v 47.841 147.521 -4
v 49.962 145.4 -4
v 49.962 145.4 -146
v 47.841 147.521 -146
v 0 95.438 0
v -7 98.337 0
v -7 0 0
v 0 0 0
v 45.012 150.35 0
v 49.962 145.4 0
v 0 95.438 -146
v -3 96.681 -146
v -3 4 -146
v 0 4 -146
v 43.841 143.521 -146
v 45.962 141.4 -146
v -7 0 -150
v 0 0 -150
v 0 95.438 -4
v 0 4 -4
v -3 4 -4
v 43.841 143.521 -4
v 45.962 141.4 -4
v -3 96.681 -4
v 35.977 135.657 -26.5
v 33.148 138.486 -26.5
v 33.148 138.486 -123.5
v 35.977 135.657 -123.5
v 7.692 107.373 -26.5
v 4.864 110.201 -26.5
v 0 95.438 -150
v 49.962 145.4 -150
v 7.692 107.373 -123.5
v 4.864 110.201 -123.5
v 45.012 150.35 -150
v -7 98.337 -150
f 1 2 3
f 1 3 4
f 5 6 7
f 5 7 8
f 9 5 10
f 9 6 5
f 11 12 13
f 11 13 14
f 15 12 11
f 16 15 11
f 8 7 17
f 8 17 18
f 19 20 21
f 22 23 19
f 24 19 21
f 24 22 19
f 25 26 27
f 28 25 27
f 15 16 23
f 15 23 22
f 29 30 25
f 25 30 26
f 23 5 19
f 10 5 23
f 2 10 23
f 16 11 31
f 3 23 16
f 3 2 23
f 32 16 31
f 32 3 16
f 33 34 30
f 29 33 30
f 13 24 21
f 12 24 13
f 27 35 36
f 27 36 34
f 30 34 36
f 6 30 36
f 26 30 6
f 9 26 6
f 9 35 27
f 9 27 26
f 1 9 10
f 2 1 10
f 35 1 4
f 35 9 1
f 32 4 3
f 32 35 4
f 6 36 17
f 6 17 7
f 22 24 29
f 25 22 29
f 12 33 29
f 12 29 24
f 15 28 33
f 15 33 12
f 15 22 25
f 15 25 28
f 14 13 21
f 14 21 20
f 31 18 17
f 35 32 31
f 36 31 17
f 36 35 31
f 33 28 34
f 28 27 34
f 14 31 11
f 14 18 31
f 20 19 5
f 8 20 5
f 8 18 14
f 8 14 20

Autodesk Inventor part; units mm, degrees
ref_plane "YZ Plane" through (0, 0, 0) normal (1, 0, 0) x (0, 1, 0)
ref_plane "XZ Plane" through (0, 0, 0) normal (0, 1, 0) x (-1, 0, 0)
ref_plane "XY Plane" through (0, 0, 0) normal (0, 0, 1) x (1, 0, 0)
sketch "Sketch1" plane through (0, 0, 0) normal (0, 1, 0) x (-1, 0, 0)
  line L0 (0, 0) -> (7, 0)
  line L1 (7, 0) -> (7, -150)
  line L2 (7, -150) -> (0, -150)
  line L3 (0, -150) -> (0, -146)
  line L4 (0, -146) -> (3, -146)
  line L5 (3, -146) -> (3, -4)
  line L6 (3, -4) -> (0, -4)
  line L7 (0, -4) -> (0, 0)
  dimension "d4" = 7
  dimension "d5" = 3
  dimension "d6" = 4
  dimension "d7" = 150
sketch "Sketch2" plane through (0, 0, 0) normal (0, 0, 1) x (1, 0, 0)
  line L0 (0, 0) -> (0, 95.438)
  line L1 (0, 95.438) -> (49.962, 145.4)
  dimension "d8" = 135
  dimension "d9" = 95.438
  dimension "d10" = 70.657
sweep "Sweep1" add profiles "Sketch1" path "Sketch2"
sketch "Sketch3" plane through (45.0123, 150.3498, -150) normal (0.7071, 0.7071, 0) x (-0.7071, 0.7071, 0)
  line L0 (-7, 150) -> (-7, 146) projected
  line L1 (-74.4849, 4) -> (-7, 4) projected
  line L2 (-7, 146) -> (-7, 4)
  line L3 (-72.3635, 146) -> (-4, 146) projected
  line L4 (-7, 146) -> (-4, 146)
  line L5 (-4, 4) -> (-7, 4) projected
  line L6 (-4, 146) -> (-4, 4)
  line L7 (-4, 4) -> (-7, 4)
  point P0 (-74.4849, 150)
extrude "Extrusion1" add sketch "Sketch3" against normal blind 5.657
sketch "Sketch5" plane through (-7, 0, 0) normal (0, -1, 0) x (1, 0, 0)
  line L0 (4, -4) -> (4, -146) projected
  line L1 (7, -4) -> (4, -4) projected
  line L2 (4, -146) -> (7, -146) projected
  line L3 (7, -146) -> (7, -4)
  line L4 (7, -146) -> (7, -150) projected
  point P0 (7, 0)
extrude "Extrusion2" add sketch "Sketch5" against normal blind 4
sketch "Sketch6" plane through (-7, 98.3375, -150) normal (-0.7071, 0.7071, 0) x (-0.7071, -0.7071, 0)
  line L0 (-16.7782, 123.5) -> (-56.7782, 123.5)
  line L1 (-56.7782, 123.5) -> (-56.7782, 26.5)
  line L2 (-56.7782, 26.5) -> (-16.7782, 26.5)
  line L3 (-16.7782, 26.5) -> (-16.7782, 123.5)
  line L4 (0, 0) -> (0, 150) projected
  line L5 (0, 0) -> (-73.5565, 0) projected
  point P0 (64.5854, 150)
  point P1 (-16.7782, 75)
  point P2 (0, 75)
  point P3 (-36.7782, 26.5)
  point P4 (-36.7782, 0)
  dimension "d17" = 97
  dimension "d18" = 40
extrude "Extrusion3" cut sketch "Sketch6" against normal blind 4
properties part number "lid"
